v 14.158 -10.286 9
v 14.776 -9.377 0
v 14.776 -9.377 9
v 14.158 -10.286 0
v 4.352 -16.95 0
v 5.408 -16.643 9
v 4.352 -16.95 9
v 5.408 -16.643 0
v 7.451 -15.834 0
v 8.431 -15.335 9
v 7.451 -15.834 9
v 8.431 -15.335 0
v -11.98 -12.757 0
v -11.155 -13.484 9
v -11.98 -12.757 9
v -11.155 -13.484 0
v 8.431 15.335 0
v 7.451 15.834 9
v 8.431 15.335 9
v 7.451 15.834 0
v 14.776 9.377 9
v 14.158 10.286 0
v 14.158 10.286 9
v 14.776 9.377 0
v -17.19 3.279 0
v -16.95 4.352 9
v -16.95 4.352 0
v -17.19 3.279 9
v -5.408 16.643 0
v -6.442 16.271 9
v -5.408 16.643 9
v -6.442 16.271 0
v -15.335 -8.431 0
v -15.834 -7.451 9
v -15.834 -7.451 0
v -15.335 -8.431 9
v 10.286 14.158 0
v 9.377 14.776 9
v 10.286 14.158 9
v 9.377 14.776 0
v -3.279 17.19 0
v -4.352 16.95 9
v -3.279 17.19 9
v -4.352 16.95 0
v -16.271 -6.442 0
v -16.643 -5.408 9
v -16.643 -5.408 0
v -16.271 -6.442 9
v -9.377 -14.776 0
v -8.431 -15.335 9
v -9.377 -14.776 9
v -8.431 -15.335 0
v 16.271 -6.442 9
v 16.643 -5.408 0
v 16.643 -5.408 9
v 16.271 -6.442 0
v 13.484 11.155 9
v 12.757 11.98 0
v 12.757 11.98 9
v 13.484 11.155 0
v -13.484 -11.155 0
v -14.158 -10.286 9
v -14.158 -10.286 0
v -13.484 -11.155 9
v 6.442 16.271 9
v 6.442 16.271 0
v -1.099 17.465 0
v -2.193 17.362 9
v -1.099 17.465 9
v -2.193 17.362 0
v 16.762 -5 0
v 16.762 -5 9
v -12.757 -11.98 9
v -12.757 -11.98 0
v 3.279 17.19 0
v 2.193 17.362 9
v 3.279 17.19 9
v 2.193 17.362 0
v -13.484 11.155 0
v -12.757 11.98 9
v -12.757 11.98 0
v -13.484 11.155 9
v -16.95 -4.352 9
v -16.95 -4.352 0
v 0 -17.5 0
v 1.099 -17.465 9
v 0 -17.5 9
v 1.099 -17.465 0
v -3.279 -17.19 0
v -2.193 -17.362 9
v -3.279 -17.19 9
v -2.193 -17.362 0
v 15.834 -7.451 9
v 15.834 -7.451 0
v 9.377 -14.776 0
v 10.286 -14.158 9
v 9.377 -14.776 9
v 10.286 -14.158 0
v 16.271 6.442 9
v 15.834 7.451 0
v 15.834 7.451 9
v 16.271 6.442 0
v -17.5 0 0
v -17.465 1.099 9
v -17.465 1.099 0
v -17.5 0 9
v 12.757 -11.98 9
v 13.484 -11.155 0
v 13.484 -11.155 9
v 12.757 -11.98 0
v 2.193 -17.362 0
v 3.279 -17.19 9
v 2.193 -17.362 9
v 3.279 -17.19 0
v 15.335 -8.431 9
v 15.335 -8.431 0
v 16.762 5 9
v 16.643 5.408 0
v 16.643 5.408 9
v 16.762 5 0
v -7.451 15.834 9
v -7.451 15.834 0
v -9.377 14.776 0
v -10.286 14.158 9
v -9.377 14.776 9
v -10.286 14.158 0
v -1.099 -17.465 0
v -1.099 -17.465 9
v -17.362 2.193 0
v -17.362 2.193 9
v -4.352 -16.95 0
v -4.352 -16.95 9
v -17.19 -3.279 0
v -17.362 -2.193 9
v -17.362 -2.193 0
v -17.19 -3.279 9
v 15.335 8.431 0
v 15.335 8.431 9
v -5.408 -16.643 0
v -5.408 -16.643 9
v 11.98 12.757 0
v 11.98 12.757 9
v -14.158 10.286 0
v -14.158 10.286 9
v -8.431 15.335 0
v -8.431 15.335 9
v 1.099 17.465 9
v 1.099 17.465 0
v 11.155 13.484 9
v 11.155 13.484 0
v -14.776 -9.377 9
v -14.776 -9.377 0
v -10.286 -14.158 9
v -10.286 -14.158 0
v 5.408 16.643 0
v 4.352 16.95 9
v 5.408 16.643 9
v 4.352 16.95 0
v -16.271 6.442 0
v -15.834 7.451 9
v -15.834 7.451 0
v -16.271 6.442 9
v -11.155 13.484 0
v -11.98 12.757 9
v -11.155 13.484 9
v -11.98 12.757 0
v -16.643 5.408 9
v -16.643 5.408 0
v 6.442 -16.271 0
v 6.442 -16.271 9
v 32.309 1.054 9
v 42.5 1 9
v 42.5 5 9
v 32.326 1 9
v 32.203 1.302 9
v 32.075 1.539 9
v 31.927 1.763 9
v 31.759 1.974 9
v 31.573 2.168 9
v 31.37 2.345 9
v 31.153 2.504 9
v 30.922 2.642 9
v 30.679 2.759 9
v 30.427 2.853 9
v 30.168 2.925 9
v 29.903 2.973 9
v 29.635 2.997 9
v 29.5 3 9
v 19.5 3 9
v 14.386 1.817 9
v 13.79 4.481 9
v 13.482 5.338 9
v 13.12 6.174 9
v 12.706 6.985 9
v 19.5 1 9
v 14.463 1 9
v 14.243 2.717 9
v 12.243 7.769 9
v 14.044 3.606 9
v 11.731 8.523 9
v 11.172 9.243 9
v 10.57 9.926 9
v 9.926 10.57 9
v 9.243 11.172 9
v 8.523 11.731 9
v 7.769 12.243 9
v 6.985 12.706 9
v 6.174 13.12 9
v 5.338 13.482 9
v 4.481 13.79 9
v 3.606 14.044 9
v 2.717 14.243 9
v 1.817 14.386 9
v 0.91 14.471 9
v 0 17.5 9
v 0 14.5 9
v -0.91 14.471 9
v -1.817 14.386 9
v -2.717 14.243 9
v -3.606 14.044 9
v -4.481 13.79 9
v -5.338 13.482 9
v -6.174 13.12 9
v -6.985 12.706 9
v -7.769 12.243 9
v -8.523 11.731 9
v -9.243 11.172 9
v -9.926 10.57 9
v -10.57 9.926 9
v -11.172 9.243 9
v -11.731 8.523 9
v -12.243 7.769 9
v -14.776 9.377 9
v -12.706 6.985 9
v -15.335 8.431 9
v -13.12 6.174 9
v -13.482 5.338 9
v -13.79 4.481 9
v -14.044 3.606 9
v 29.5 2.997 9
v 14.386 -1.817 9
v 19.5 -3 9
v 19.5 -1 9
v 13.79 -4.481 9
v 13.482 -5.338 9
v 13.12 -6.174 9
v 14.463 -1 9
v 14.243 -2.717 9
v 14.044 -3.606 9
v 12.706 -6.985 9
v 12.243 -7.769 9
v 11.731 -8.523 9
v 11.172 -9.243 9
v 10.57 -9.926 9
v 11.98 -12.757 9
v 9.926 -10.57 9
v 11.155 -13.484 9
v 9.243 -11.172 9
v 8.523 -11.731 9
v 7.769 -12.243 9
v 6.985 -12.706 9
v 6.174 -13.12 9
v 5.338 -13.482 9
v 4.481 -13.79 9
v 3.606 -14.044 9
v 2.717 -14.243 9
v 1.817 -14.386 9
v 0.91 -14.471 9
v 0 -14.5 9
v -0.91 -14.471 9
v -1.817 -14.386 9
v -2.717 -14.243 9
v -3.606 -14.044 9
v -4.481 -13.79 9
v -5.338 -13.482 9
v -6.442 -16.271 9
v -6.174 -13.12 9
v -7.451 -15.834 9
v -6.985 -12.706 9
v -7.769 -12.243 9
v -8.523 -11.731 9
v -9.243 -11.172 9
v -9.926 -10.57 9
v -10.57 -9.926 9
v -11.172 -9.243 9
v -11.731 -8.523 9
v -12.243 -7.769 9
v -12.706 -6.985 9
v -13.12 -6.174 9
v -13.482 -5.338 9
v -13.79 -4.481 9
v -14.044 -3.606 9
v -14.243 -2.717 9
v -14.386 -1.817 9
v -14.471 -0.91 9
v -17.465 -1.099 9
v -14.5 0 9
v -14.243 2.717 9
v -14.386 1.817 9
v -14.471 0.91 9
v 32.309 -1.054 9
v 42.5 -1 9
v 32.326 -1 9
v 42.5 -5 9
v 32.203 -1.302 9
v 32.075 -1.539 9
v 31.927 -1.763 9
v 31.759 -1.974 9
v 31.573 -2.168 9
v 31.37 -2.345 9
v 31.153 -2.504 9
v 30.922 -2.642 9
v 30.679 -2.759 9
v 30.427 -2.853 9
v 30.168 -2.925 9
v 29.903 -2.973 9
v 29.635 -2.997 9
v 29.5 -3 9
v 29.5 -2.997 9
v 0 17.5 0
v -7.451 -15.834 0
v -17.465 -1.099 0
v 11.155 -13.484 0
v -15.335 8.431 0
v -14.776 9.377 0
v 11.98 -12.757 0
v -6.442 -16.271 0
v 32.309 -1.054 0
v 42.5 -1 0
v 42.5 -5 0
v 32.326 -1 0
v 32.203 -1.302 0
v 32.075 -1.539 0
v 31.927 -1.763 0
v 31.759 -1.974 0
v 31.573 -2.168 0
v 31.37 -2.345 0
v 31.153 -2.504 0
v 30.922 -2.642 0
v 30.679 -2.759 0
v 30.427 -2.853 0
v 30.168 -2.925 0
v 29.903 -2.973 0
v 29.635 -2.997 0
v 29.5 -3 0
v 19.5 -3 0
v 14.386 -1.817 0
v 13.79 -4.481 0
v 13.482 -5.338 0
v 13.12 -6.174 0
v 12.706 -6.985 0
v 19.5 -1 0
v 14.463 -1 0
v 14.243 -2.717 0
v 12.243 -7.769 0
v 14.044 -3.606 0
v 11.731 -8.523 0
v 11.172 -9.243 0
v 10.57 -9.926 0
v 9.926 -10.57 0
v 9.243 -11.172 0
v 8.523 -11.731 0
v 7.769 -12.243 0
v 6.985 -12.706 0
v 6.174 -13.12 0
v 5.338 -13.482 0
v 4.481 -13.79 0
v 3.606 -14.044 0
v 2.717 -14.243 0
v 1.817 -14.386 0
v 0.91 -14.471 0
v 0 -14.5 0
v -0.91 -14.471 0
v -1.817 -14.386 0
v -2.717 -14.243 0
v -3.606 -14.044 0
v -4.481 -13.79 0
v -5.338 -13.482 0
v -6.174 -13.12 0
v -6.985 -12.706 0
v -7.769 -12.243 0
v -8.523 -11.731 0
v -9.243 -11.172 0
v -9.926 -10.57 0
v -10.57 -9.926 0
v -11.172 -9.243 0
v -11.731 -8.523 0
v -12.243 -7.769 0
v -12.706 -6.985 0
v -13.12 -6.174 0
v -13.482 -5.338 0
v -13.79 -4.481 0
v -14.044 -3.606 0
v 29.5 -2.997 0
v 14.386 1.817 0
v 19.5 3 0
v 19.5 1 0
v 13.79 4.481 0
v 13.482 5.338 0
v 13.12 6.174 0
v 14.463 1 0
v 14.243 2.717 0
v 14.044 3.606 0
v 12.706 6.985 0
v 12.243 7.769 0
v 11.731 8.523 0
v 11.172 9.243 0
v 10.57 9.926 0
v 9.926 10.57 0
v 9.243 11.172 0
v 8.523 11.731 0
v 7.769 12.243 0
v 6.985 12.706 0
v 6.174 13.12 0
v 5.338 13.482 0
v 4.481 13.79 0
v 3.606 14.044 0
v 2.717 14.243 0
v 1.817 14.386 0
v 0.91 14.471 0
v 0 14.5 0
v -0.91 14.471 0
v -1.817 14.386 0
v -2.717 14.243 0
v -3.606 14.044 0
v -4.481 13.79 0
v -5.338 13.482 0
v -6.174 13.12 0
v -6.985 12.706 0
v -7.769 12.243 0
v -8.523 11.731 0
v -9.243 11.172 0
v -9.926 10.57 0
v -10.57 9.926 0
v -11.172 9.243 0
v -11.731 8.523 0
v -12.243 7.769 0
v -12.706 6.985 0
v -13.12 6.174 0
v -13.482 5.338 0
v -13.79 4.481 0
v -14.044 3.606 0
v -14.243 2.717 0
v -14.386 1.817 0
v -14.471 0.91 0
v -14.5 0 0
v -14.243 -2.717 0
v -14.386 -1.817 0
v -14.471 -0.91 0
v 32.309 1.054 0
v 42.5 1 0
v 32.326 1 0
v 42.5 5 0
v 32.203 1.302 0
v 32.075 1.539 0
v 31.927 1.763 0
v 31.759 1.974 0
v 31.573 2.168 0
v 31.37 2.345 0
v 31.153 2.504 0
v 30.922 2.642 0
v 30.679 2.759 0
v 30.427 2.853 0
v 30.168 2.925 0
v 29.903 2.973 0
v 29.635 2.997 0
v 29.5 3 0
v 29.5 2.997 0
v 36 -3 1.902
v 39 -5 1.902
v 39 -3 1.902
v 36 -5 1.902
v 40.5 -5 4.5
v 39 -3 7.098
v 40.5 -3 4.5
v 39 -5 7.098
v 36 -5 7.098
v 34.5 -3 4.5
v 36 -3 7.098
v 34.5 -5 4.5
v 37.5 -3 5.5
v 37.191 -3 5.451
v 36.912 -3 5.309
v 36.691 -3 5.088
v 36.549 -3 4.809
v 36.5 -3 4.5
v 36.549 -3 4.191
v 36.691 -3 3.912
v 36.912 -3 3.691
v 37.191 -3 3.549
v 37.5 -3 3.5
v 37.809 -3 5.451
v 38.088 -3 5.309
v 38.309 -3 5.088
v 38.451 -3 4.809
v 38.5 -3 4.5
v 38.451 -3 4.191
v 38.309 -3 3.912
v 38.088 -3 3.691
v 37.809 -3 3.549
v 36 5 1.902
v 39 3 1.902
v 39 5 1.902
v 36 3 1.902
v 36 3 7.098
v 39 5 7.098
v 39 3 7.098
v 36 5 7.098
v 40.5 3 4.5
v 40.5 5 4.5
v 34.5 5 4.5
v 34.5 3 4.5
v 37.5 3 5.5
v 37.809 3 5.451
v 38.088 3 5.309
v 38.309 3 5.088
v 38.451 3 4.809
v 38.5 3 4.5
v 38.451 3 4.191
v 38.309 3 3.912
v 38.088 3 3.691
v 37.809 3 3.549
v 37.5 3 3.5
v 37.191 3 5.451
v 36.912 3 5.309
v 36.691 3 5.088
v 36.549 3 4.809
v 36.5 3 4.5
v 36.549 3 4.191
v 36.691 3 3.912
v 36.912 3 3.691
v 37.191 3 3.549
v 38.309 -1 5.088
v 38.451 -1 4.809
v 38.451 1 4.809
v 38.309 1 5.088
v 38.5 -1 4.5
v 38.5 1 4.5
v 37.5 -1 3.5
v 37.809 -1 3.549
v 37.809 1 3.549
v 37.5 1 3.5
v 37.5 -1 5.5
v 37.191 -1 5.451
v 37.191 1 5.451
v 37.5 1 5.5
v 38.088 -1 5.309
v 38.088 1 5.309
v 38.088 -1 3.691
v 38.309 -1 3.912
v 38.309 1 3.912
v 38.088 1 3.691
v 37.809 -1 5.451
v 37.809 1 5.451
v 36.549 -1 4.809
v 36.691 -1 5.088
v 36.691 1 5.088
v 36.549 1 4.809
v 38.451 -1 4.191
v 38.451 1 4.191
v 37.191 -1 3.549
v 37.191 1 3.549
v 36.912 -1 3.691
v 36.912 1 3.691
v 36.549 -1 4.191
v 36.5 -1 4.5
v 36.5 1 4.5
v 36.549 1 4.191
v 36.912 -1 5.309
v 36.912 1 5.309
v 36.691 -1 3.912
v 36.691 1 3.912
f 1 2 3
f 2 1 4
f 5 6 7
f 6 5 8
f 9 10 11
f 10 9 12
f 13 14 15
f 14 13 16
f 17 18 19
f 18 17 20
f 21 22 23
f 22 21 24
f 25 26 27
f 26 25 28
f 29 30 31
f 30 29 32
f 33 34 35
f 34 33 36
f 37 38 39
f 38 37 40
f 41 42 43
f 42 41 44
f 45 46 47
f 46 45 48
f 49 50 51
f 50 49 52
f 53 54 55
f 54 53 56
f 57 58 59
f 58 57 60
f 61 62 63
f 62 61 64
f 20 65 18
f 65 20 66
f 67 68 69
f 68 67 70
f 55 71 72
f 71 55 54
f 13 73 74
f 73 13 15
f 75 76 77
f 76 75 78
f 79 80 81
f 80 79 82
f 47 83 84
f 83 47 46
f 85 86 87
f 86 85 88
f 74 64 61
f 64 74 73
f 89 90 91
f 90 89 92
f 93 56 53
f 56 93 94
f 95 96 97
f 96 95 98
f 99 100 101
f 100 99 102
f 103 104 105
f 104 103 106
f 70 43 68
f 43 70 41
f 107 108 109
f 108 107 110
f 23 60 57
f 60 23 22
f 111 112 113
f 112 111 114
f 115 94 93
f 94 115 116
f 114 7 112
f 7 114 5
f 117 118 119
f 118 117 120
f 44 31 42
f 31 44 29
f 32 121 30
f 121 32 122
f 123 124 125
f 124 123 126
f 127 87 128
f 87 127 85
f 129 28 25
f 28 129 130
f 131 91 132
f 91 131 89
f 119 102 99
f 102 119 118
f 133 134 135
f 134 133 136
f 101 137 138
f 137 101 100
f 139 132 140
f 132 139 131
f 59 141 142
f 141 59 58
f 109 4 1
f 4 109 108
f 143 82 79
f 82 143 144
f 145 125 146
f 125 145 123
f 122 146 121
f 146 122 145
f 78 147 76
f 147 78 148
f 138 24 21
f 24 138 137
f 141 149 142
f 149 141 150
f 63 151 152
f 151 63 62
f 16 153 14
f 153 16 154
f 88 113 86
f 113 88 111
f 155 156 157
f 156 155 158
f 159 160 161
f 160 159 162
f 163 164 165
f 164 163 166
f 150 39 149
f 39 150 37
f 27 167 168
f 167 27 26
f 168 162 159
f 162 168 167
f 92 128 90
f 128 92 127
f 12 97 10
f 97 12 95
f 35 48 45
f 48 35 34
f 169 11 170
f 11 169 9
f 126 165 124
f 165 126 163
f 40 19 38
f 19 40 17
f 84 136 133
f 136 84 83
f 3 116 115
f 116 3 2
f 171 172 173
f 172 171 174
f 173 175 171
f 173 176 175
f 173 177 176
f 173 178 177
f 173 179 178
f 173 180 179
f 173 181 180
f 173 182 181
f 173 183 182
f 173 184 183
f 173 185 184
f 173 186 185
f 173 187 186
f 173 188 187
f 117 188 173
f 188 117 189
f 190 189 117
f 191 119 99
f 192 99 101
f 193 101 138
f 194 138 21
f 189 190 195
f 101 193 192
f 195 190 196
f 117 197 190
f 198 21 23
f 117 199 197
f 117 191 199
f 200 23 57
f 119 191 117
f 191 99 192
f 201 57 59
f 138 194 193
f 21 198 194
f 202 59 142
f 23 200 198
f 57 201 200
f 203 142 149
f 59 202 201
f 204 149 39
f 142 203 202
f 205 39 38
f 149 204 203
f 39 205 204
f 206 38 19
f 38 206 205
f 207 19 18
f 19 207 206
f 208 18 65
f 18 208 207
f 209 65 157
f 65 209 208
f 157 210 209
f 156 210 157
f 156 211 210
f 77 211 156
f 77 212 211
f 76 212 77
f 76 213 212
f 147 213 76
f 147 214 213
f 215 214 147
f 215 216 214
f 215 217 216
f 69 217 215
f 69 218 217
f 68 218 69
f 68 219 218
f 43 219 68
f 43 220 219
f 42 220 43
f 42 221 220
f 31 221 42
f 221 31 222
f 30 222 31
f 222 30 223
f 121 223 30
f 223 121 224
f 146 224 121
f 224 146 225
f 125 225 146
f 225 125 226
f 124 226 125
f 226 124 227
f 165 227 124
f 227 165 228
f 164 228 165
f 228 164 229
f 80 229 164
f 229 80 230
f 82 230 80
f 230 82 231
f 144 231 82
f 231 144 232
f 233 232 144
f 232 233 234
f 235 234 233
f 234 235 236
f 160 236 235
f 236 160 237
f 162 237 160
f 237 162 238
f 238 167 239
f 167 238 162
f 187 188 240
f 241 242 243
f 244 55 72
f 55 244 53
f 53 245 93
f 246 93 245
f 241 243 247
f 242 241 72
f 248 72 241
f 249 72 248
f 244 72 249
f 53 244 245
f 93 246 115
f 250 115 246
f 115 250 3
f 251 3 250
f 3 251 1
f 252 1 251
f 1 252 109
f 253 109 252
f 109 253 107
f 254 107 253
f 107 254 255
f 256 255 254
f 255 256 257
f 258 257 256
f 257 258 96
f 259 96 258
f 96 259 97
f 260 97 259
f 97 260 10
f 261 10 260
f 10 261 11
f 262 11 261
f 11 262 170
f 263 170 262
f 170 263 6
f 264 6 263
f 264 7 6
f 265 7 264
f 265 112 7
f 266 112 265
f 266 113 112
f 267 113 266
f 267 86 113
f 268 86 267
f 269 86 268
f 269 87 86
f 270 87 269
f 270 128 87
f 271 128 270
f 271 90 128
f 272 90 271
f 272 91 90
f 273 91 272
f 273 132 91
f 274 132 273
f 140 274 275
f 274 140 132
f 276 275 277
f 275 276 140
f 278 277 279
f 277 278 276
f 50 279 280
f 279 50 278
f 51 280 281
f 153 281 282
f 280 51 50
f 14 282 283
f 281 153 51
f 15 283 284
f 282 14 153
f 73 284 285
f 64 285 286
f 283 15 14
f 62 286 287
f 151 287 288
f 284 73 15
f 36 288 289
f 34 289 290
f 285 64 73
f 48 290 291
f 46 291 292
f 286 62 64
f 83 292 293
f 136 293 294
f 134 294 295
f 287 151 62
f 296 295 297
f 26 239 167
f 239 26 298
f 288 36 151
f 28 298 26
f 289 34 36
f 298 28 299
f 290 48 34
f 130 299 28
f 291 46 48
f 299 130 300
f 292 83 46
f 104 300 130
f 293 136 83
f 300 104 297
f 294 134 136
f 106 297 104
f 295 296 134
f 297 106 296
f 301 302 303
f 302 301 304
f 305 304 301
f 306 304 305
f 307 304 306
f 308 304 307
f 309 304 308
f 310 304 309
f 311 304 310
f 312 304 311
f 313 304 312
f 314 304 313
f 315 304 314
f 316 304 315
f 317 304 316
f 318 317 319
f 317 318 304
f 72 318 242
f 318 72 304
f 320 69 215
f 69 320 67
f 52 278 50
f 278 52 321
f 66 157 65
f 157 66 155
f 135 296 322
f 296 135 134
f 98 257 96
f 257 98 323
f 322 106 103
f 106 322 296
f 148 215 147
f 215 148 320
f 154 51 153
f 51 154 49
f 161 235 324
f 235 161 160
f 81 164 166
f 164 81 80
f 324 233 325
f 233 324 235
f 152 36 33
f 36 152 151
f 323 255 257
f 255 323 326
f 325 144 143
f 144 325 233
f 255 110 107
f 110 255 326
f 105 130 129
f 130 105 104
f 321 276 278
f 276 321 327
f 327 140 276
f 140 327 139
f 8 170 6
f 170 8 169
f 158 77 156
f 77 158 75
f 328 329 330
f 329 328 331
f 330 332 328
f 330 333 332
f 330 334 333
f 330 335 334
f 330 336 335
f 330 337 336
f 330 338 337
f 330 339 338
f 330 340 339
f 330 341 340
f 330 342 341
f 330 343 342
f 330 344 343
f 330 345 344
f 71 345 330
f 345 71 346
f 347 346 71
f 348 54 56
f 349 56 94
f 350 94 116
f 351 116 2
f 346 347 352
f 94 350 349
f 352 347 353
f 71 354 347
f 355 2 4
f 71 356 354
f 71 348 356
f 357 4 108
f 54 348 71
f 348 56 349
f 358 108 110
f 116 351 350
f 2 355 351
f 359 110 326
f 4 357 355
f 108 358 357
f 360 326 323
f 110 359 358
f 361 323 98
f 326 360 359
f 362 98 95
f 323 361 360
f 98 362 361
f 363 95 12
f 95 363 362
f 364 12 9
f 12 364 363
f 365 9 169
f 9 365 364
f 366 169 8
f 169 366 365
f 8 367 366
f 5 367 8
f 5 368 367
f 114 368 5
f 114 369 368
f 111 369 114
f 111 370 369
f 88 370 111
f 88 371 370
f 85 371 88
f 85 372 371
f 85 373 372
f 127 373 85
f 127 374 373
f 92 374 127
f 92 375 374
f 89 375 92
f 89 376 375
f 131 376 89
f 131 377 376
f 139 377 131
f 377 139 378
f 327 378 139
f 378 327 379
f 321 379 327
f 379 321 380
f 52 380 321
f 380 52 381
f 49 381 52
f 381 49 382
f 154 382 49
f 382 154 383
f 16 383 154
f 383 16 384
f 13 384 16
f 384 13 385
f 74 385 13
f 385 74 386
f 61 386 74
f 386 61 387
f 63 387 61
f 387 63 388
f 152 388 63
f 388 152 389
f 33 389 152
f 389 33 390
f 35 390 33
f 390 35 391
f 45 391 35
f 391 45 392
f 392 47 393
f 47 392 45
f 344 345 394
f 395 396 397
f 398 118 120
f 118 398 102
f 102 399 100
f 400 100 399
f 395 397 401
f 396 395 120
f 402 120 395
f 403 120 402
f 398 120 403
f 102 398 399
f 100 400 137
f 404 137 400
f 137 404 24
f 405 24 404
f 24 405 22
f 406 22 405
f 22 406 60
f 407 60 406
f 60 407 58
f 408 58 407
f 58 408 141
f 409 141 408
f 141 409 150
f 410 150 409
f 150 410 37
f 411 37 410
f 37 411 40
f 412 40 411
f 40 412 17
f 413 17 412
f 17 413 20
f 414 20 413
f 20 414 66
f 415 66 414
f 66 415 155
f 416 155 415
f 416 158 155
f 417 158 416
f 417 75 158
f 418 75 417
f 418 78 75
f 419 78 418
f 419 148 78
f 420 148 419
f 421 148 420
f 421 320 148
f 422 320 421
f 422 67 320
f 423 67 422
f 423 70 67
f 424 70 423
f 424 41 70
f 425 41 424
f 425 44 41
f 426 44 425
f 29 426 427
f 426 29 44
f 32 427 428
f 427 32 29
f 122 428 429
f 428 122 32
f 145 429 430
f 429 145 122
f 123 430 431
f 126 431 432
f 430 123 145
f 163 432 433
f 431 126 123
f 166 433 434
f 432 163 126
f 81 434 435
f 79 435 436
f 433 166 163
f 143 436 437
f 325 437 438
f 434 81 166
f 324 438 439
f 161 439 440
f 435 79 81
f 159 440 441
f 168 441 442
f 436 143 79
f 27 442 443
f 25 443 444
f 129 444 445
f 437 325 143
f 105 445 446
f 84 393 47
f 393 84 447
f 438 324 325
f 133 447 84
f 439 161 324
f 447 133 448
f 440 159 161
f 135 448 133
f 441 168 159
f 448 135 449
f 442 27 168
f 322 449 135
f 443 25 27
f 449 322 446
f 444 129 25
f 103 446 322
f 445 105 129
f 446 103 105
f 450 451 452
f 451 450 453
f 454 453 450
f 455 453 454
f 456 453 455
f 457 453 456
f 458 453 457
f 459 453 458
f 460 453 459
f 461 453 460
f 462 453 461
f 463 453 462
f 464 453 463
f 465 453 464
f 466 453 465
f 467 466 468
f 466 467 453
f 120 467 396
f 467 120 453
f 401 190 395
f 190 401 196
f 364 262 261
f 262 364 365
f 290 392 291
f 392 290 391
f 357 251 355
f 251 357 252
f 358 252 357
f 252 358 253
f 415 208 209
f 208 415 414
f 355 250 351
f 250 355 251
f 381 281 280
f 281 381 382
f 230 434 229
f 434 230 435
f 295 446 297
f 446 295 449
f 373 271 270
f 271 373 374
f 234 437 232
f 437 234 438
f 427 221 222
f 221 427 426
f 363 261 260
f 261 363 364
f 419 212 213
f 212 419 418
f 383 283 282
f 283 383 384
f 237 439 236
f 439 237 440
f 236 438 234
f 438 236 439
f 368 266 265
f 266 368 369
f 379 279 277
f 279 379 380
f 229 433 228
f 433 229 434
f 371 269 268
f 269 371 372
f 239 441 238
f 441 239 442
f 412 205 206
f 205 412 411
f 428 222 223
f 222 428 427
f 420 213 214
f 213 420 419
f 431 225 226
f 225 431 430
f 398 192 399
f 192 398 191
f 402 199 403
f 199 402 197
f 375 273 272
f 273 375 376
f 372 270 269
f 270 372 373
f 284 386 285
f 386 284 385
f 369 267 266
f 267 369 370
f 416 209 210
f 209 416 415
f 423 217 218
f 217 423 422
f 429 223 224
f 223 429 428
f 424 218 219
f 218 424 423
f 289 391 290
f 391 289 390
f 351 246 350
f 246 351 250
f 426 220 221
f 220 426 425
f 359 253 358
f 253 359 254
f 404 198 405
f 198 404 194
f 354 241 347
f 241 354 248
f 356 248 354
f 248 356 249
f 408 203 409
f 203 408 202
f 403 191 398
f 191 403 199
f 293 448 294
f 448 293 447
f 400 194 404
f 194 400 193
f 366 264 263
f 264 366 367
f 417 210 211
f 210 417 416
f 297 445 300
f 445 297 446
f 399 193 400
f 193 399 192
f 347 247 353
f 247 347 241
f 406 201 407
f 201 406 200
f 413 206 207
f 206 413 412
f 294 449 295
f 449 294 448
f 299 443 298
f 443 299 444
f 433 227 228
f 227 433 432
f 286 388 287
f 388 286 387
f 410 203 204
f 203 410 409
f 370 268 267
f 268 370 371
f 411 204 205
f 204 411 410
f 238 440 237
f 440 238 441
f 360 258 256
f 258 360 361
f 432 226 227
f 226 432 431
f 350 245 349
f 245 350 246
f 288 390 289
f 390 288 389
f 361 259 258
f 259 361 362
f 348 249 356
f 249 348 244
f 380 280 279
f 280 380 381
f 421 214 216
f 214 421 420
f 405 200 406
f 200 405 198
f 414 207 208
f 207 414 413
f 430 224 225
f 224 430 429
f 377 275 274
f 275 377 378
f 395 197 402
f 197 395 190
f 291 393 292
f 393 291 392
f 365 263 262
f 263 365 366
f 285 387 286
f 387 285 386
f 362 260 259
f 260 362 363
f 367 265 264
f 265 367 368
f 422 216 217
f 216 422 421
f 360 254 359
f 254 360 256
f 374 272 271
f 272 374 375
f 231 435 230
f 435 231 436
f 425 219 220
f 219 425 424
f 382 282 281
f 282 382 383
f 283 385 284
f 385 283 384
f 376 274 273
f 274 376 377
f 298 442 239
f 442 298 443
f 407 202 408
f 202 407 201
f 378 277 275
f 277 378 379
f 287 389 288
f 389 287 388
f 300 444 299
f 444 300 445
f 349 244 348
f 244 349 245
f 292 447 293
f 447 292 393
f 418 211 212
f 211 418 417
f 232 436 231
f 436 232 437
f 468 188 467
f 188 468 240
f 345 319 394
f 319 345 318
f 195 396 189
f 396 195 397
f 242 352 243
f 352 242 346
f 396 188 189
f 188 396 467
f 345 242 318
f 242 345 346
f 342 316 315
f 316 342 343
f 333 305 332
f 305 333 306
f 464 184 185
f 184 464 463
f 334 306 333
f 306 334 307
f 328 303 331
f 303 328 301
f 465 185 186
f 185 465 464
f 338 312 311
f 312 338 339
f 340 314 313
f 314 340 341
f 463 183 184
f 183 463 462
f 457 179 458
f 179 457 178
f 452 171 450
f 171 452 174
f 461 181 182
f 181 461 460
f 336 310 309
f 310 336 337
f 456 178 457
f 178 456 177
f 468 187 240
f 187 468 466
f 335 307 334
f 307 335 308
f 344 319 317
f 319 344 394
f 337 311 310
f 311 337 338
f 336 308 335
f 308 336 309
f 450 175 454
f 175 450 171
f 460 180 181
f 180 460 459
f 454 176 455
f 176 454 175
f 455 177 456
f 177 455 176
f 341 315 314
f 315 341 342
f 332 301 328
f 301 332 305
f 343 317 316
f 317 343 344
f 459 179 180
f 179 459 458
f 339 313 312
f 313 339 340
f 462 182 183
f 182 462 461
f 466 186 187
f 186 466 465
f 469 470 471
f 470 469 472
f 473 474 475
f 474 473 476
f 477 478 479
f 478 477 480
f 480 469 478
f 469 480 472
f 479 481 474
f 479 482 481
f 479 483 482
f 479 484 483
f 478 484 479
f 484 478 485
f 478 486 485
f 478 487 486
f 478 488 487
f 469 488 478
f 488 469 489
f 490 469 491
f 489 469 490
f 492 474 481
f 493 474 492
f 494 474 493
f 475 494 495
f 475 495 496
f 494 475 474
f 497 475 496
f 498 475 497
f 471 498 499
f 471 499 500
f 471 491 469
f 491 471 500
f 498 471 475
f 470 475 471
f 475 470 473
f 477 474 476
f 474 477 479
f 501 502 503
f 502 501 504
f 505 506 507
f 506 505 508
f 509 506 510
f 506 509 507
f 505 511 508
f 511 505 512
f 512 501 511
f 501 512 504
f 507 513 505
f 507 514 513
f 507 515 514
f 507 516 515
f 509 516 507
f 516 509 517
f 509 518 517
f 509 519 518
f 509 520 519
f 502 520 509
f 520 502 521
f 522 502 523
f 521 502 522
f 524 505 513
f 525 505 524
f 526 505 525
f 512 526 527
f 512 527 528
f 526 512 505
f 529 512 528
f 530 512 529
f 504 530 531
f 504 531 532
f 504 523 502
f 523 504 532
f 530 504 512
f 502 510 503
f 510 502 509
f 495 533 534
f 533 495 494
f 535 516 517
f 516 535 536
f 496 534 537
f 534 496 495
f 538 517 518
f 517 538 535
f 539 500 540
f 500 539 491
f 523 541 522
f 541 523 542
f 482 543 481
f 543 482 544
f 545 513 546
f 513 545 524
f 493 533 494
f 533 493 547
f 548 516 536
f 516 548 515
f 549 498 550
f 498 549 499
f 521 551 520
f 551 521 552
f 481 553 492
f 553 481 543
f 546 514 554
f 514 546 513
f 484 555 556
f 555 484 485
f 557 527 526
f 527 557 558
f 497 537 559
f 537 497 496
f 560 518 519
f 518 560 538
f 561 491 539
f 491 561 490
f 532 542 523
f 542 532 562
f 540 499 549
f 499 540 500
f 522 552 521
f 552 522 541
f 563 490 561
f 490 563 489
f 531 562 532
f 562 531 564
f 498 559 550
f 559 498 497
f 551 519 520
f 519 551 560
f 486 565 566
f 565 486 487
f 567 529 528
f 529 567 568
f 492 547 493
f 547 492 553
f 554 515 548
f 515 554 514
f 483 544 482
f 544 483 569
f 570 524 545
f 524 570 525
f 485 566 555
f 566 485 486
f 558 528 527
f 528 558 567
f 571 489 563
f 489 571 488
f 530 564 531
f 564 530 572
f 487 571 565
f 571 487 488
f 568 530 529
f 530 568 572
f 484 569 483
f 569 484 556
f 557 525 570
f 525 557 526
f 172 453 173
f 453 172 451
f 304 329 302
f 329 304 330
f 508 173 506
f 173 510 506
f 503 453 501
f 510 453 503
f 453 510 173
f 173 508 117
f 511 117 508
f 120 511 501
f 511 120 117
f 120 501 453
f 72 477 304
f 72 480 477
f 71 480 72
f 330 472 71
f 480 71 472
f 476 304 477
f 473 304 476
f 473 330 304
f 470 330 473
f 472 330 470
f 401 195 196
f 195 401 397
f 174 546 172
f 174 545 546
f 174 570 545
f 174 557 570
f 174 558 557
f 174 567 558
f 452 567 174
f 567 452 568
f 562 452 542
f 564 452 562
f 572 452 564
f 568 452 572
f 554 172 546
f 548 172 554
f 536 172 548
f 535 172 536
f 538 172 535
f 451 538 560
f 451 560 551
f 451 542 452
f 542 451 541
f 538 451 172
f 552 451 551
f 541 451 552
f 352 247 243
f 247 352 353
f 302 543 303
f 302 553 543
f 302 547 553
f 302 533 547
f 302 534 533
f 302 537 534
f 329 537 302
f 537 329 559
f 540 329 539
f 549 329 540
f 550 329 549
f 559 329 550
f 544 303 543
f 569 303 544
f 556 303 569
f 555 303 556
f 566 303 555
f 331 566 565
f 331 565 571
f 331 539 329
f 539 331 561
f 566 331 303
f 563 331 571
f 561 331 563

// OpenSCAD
// file: ../neon-like-strips/clasp/neon-like-strip-clasp.scad
use <../led-strip/led-strip.scad>;

module stripClasp(claspThickness = 4,
                  xLength = 88,
                  claspLength = 15)
{
    claspWidth = neonLikeLedStrip_width() + claspThickness; 
 
    union()
    {
        stripClasp_main(xLength = xLength,
                        claspLength = claspLength,
                        claspThickness = claspThickness,
                        claspWidth = claspWidth
                        );
    }
} 

module stripClasp_main(xLength,
                        claspLength,
                        claspThickness,
                        claspWidth)
{
    difference()
    {
        cube([xLength, claspWidth, claspLength ]);
 
        yTranslate = neonLikeLedStrip_width() / 2.0 - 1;
        xTranslate = 2;
        color("lime")
        translate([xTranslate, yTranslate, -0.01])
        neonLikeLedStrip(length = 20);

        stripClasp_screwHolder(claspLength = claspLength,
                               xLength = xLength);
    }
}
 
module stripClasp_screwHolder(claspLength, xLength)
{
    // bolt recess x2
    boltRecesRadius = 3;
    xTranslate = xLength - 5;
    yTranslate = claspLength / 2.0 ;
    zTranslate = -2;  //-15;    
    rotate([90,0,0])
    translate([xTranslate, yTranslate, zTranslate])
    color("blue")
    cylinder(r=boltRecesRadius, h=5, $fn = 6);

    zTranslate_second = -claspLength  - 4;
    rotate([90,0,0])
    translate([xTranslate, yTranslate, zTranslate_second])
    color("grey")
    cylinder(r=boltRecesRadius, h=5, $fn = 6);


    // bolt hole
    rotate([90,0,0])
    translate([xTranslate, yTranslate, zTranslate_second])
    color("green")
    cylinder(r=1, h=15, $fn = 20);
}
// file: ../neon-like-strips/led-strip/led-strip.scad
function neonLikeLedStrip_width() = 6;

function neonLikeLedStrip_height() = 13;

module neonLikeLedStrip(length = 10)
{
    union()
    {
        radius = neonLikeLedStrip_width() / 2.0;

        cubeX = neonLikeLedStrip_height() - radius;

        cubeY = neonLikeLedStrip_width();

        color("white")
        cube([cubeX, cubeY, length]);
    
        color("green")
        translate([cubeX, radius, 0])
        cylinder(r = radius, h= length, $fn = 70);
    }
}
// file: ../../../../../shapes/open-cylinder/open-cylinder.scad
// TODO: Lower this to 50.
module openCylinder(height = 3,
                    outerRadius = 7,
                    innerRadius = 4.5,
                    fn = 100)
{
    $fn = fn;

    difference()
    {
        cylinder(r=outerRadius,
                 h=height);

        translate([0, 0, -1])
        cylinder(r=innerRadius,
                 h=height+1.01);
    }
}
// file: ../neon-like-strips/neon-like-led-strip-pipe-fastener.scad
use <../../../../../shapes/open-cylinder/open-cylinder.scad>

use <led-strip/led-strip.scad>;
use <clasp/neon-like-strip-clasp.scad>;

module neonLikeLedStripPipeFastener(fastenerHeight = 9,
                                    fastenerThickness = 8,
                                    innerRadius = 33,
                                    ledStripLength = 300,
                                    showLedStrip = false)
{
    difference()
    {
        neonLikeLedStripPipeFastenerSolid(fastenerHeight = fastenerHeight,
                                         fastenerThickness = fastenerThickness,
                                         innerRadius = innerRadius,
                                         ledStripLength = ledStripLength,
                                         showLedStrip = showLedStrip);

        width = 2;
        yTranslate = -width / 2.0;
        translate([0, yTranslate, -0.01])
        cube([100, width, 25]);
    }
}

module neonLikeLedStripPipeFastenerSolid(fastenerHeight,
                                    fastenerThickness,
                                    innerRadius,
                                    ledStripLength,
                                    showLedStrip)
{
    union()
    {
        if(showLedStrip)
        {
            xTranslate = innerRadius + fastenerThickness;
            yTranslate = 0;
            zTranslate = -ledStripLength / 2.0;
            translate([xTranslate, yTranslate, zTranslate])
            neonLikeLedStrip(length = ledStripLength);
        }

        pipeFastener(fastenerThickness = fastenerThickness,
                     height = fastenerHeight,
                     innerRadius = innerRadius
                     );
   
        stipFastener(height = fastenerHeight,
                     fastenerThickness = fastenerThickness,
                     innerRadius = innerRadius);
    }    
}

module pipeFastener(fastenerThickness = 5,
                    height = 9,
                    innerRadius = 10)
{
    outerRadius = innerRadius + fastenerThickness;

    openCylinder(height = height,
                innerRadius = innerRadius,
                outerRadius = outerRadius);
}

module stipFastener(fastenerThickness = 2,
                    height = 10,
                    innerRadius = 1) 
{
    // attacherator
    attacheratorLength_x = 2;
    attacheratorLength_y = neonLikeLedStrip_width() + fastenerThickness + 1;
    attacheratorTranslate_x = fastenerThickness + innerRadius -1;
    attacheratorTranslate_y = -attacheratorLength_y / 2.0;
    color("purple")
    translate([attacheratorTranslate_x, attacheratorTranslate_y, 0])
    cube([attacheratorLength_x, attacheratorLength_y, height]);

    claspThickness = 4;
    xTranslate = innerRadius + fastenerThickness;
    yTranslate = -(neonLikeLedStrip_width() + claspThickness) / 2.0;
    translate([xTranslate, yTranslate, 0])
    stripClasp(claspThickness = claspThickness,
               xLength = height + 8 + 8,
               claspLength = height);
}
// main file
use <../neon-like-strips/neon-like-led-strip-pipe-fastener.scad>

/*

House of Manny

	frame outer diameter

		22mm

        but to accomodate the blankets/tarps the outter diameter needs to be 26mm

    frame inner diameter

        15mm

*/

desiredOuterDiameter = 23; // 26 was too loose;
desiredInnerDiameter = 15;
fastenerThickness = 3;

innerRadius = desiredOuterDiameter / 2.0 + fastenerThickness;


neonLikeLedStripPipeFastener(fastenerHeight = 9,
                             fastenerThickness = fastenerThickness,
                             innerRadius = innerRadius,
                             ledStripLength = 50);
